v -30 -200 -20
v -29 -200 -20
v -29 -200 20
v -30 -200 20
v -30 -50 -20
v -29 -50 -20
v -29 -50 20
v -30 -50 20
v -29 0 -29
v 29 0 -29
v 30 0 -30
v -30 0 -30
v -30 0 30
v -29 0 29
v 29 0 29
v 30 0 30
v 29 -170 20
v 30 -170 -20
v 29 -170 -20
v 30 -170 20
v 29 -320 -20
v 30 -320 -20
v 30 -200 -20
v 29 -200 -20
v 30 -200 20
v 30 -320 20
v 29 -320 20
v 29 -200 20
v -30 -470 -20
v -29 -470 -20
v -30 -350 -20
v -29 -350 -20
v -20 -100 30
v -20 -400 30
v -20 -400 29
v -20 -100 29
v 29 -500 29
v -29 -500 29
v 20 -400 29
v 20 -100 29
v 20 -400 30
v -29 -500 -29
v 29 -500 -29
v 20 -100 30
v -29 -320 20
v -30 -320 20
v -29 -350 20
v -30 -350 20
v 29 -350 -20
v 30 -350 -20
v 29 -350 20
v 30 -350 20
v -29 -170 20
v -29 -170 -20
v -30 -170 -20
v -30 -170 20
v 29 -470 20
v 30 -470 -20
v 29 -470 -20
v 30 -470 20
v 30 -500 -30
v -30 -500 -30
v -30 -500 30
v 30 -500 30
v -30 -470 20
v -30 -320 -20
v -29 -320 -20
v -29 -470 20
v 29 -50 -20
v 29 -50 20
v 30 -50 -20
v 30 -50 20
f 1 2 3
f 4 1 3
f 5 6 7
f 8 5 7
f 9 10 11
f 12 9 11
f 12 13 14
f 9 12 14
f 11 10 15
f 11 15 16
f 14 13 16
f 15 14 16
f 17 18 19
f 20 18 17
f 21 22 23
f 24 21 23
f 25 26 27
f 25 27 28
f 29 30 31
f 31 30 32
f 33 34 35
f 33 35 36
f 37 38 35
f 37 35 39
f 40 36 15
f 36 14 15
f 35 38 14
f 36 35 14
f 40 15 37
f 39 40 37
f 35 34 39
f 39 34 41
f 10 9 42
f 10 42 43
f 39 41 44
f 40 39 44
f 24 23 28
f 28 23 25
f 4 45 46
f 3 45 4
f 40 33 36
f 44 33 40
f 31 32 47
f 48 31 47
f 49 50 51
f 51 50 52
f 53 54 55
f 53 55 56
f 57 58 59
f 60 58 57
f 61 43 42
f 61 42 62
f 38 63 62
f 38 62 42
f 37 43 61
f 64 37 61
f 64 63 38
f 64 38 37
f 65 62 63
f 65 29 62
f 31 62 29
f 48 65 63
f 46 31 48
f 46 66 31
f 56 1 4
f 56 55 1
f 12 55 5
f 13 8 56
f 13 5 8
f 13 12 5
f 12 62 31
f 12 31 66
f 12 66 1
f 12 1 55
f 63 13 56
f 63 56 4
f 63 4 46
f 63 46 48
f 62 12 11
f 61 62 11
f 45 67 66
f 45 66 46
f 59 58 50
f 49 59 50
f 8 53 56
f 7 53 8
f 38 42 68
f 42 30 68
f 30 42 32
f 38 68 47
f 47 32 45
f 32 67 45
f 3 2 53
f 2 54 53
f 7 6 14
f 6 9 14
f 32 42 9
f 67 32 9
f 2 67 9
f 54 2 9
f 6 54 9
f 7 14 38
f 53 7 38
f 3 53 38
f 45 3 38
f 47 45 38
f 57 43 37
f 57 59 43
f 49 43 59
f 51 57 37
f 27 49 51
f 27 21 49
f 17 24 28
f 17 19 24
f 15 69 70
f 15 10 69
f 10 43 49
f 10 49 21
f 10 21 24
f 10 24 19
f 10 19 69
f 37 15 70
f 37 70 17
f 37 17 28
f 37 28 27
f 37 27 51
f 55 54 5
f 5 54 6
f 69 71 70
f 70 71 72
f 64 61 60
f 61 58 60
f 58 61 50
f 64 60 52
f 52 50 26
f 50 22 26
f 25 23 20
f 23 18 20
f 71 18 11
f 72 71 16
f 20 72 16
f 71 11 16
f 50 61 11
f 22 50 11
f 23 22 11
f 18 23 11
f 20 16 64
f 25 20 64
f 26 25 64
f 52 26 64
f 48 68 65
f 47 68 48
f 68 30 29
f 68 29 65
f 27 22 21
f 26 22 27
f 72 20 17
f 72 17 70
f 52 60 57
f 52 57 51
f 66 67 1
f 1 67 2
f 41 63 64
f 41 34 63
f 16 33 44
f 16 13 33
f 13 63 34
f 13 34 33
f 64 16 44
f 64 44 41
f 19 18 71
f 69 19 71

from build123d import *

# Parameters (mm, degrees)
F0_W     = 60
F0_H     = 60
F0_W_2   = 57.999998
F0_H_2   = 58
F1_DEPTH = 500
F2_W     = 120
F2_H     = 40
F3_DEPTH = 150
F4_W     = 40
F4_H     = 300
F5_DEPTH = 25


with BuildPart() as f1:
    # F0 (on Front) → F1 (new body)
    with BuildSketch(Plane.XZ):
        Rectangle(F0_W, F0_H)
        Rectangle(F0_W_2, F0_H_2, mode=Mode.SUBTRACT)
    extrude(amount=F1_DEPTH)

    # F2 (on face) → F3 (cut)
    with BuildSketch(Plane.YZ.offset(30)):
        with Locations((-410, 0)):
            Rectangle(F2_W, F2_H)
        with Locations((-260, 0)):
            Rectangle(F2_W, F2_H)
        with Locations((-110, 0)):
            Rectangle(F2_W, F2_H)
    extrude(amount=-F3_DEPTH, mode=Mode.SUBTRACT)

    # F4 (on face) → F5 (cut)
    with BuildSketch(Plane.XY.offset(30)):
        with Locations((0, -250)):
            Rectangle(F4_W, F4_H)
    extrude(amount=-F5_DEPTH, mode=Mode.SUBTRACT)


solid = f1.part
